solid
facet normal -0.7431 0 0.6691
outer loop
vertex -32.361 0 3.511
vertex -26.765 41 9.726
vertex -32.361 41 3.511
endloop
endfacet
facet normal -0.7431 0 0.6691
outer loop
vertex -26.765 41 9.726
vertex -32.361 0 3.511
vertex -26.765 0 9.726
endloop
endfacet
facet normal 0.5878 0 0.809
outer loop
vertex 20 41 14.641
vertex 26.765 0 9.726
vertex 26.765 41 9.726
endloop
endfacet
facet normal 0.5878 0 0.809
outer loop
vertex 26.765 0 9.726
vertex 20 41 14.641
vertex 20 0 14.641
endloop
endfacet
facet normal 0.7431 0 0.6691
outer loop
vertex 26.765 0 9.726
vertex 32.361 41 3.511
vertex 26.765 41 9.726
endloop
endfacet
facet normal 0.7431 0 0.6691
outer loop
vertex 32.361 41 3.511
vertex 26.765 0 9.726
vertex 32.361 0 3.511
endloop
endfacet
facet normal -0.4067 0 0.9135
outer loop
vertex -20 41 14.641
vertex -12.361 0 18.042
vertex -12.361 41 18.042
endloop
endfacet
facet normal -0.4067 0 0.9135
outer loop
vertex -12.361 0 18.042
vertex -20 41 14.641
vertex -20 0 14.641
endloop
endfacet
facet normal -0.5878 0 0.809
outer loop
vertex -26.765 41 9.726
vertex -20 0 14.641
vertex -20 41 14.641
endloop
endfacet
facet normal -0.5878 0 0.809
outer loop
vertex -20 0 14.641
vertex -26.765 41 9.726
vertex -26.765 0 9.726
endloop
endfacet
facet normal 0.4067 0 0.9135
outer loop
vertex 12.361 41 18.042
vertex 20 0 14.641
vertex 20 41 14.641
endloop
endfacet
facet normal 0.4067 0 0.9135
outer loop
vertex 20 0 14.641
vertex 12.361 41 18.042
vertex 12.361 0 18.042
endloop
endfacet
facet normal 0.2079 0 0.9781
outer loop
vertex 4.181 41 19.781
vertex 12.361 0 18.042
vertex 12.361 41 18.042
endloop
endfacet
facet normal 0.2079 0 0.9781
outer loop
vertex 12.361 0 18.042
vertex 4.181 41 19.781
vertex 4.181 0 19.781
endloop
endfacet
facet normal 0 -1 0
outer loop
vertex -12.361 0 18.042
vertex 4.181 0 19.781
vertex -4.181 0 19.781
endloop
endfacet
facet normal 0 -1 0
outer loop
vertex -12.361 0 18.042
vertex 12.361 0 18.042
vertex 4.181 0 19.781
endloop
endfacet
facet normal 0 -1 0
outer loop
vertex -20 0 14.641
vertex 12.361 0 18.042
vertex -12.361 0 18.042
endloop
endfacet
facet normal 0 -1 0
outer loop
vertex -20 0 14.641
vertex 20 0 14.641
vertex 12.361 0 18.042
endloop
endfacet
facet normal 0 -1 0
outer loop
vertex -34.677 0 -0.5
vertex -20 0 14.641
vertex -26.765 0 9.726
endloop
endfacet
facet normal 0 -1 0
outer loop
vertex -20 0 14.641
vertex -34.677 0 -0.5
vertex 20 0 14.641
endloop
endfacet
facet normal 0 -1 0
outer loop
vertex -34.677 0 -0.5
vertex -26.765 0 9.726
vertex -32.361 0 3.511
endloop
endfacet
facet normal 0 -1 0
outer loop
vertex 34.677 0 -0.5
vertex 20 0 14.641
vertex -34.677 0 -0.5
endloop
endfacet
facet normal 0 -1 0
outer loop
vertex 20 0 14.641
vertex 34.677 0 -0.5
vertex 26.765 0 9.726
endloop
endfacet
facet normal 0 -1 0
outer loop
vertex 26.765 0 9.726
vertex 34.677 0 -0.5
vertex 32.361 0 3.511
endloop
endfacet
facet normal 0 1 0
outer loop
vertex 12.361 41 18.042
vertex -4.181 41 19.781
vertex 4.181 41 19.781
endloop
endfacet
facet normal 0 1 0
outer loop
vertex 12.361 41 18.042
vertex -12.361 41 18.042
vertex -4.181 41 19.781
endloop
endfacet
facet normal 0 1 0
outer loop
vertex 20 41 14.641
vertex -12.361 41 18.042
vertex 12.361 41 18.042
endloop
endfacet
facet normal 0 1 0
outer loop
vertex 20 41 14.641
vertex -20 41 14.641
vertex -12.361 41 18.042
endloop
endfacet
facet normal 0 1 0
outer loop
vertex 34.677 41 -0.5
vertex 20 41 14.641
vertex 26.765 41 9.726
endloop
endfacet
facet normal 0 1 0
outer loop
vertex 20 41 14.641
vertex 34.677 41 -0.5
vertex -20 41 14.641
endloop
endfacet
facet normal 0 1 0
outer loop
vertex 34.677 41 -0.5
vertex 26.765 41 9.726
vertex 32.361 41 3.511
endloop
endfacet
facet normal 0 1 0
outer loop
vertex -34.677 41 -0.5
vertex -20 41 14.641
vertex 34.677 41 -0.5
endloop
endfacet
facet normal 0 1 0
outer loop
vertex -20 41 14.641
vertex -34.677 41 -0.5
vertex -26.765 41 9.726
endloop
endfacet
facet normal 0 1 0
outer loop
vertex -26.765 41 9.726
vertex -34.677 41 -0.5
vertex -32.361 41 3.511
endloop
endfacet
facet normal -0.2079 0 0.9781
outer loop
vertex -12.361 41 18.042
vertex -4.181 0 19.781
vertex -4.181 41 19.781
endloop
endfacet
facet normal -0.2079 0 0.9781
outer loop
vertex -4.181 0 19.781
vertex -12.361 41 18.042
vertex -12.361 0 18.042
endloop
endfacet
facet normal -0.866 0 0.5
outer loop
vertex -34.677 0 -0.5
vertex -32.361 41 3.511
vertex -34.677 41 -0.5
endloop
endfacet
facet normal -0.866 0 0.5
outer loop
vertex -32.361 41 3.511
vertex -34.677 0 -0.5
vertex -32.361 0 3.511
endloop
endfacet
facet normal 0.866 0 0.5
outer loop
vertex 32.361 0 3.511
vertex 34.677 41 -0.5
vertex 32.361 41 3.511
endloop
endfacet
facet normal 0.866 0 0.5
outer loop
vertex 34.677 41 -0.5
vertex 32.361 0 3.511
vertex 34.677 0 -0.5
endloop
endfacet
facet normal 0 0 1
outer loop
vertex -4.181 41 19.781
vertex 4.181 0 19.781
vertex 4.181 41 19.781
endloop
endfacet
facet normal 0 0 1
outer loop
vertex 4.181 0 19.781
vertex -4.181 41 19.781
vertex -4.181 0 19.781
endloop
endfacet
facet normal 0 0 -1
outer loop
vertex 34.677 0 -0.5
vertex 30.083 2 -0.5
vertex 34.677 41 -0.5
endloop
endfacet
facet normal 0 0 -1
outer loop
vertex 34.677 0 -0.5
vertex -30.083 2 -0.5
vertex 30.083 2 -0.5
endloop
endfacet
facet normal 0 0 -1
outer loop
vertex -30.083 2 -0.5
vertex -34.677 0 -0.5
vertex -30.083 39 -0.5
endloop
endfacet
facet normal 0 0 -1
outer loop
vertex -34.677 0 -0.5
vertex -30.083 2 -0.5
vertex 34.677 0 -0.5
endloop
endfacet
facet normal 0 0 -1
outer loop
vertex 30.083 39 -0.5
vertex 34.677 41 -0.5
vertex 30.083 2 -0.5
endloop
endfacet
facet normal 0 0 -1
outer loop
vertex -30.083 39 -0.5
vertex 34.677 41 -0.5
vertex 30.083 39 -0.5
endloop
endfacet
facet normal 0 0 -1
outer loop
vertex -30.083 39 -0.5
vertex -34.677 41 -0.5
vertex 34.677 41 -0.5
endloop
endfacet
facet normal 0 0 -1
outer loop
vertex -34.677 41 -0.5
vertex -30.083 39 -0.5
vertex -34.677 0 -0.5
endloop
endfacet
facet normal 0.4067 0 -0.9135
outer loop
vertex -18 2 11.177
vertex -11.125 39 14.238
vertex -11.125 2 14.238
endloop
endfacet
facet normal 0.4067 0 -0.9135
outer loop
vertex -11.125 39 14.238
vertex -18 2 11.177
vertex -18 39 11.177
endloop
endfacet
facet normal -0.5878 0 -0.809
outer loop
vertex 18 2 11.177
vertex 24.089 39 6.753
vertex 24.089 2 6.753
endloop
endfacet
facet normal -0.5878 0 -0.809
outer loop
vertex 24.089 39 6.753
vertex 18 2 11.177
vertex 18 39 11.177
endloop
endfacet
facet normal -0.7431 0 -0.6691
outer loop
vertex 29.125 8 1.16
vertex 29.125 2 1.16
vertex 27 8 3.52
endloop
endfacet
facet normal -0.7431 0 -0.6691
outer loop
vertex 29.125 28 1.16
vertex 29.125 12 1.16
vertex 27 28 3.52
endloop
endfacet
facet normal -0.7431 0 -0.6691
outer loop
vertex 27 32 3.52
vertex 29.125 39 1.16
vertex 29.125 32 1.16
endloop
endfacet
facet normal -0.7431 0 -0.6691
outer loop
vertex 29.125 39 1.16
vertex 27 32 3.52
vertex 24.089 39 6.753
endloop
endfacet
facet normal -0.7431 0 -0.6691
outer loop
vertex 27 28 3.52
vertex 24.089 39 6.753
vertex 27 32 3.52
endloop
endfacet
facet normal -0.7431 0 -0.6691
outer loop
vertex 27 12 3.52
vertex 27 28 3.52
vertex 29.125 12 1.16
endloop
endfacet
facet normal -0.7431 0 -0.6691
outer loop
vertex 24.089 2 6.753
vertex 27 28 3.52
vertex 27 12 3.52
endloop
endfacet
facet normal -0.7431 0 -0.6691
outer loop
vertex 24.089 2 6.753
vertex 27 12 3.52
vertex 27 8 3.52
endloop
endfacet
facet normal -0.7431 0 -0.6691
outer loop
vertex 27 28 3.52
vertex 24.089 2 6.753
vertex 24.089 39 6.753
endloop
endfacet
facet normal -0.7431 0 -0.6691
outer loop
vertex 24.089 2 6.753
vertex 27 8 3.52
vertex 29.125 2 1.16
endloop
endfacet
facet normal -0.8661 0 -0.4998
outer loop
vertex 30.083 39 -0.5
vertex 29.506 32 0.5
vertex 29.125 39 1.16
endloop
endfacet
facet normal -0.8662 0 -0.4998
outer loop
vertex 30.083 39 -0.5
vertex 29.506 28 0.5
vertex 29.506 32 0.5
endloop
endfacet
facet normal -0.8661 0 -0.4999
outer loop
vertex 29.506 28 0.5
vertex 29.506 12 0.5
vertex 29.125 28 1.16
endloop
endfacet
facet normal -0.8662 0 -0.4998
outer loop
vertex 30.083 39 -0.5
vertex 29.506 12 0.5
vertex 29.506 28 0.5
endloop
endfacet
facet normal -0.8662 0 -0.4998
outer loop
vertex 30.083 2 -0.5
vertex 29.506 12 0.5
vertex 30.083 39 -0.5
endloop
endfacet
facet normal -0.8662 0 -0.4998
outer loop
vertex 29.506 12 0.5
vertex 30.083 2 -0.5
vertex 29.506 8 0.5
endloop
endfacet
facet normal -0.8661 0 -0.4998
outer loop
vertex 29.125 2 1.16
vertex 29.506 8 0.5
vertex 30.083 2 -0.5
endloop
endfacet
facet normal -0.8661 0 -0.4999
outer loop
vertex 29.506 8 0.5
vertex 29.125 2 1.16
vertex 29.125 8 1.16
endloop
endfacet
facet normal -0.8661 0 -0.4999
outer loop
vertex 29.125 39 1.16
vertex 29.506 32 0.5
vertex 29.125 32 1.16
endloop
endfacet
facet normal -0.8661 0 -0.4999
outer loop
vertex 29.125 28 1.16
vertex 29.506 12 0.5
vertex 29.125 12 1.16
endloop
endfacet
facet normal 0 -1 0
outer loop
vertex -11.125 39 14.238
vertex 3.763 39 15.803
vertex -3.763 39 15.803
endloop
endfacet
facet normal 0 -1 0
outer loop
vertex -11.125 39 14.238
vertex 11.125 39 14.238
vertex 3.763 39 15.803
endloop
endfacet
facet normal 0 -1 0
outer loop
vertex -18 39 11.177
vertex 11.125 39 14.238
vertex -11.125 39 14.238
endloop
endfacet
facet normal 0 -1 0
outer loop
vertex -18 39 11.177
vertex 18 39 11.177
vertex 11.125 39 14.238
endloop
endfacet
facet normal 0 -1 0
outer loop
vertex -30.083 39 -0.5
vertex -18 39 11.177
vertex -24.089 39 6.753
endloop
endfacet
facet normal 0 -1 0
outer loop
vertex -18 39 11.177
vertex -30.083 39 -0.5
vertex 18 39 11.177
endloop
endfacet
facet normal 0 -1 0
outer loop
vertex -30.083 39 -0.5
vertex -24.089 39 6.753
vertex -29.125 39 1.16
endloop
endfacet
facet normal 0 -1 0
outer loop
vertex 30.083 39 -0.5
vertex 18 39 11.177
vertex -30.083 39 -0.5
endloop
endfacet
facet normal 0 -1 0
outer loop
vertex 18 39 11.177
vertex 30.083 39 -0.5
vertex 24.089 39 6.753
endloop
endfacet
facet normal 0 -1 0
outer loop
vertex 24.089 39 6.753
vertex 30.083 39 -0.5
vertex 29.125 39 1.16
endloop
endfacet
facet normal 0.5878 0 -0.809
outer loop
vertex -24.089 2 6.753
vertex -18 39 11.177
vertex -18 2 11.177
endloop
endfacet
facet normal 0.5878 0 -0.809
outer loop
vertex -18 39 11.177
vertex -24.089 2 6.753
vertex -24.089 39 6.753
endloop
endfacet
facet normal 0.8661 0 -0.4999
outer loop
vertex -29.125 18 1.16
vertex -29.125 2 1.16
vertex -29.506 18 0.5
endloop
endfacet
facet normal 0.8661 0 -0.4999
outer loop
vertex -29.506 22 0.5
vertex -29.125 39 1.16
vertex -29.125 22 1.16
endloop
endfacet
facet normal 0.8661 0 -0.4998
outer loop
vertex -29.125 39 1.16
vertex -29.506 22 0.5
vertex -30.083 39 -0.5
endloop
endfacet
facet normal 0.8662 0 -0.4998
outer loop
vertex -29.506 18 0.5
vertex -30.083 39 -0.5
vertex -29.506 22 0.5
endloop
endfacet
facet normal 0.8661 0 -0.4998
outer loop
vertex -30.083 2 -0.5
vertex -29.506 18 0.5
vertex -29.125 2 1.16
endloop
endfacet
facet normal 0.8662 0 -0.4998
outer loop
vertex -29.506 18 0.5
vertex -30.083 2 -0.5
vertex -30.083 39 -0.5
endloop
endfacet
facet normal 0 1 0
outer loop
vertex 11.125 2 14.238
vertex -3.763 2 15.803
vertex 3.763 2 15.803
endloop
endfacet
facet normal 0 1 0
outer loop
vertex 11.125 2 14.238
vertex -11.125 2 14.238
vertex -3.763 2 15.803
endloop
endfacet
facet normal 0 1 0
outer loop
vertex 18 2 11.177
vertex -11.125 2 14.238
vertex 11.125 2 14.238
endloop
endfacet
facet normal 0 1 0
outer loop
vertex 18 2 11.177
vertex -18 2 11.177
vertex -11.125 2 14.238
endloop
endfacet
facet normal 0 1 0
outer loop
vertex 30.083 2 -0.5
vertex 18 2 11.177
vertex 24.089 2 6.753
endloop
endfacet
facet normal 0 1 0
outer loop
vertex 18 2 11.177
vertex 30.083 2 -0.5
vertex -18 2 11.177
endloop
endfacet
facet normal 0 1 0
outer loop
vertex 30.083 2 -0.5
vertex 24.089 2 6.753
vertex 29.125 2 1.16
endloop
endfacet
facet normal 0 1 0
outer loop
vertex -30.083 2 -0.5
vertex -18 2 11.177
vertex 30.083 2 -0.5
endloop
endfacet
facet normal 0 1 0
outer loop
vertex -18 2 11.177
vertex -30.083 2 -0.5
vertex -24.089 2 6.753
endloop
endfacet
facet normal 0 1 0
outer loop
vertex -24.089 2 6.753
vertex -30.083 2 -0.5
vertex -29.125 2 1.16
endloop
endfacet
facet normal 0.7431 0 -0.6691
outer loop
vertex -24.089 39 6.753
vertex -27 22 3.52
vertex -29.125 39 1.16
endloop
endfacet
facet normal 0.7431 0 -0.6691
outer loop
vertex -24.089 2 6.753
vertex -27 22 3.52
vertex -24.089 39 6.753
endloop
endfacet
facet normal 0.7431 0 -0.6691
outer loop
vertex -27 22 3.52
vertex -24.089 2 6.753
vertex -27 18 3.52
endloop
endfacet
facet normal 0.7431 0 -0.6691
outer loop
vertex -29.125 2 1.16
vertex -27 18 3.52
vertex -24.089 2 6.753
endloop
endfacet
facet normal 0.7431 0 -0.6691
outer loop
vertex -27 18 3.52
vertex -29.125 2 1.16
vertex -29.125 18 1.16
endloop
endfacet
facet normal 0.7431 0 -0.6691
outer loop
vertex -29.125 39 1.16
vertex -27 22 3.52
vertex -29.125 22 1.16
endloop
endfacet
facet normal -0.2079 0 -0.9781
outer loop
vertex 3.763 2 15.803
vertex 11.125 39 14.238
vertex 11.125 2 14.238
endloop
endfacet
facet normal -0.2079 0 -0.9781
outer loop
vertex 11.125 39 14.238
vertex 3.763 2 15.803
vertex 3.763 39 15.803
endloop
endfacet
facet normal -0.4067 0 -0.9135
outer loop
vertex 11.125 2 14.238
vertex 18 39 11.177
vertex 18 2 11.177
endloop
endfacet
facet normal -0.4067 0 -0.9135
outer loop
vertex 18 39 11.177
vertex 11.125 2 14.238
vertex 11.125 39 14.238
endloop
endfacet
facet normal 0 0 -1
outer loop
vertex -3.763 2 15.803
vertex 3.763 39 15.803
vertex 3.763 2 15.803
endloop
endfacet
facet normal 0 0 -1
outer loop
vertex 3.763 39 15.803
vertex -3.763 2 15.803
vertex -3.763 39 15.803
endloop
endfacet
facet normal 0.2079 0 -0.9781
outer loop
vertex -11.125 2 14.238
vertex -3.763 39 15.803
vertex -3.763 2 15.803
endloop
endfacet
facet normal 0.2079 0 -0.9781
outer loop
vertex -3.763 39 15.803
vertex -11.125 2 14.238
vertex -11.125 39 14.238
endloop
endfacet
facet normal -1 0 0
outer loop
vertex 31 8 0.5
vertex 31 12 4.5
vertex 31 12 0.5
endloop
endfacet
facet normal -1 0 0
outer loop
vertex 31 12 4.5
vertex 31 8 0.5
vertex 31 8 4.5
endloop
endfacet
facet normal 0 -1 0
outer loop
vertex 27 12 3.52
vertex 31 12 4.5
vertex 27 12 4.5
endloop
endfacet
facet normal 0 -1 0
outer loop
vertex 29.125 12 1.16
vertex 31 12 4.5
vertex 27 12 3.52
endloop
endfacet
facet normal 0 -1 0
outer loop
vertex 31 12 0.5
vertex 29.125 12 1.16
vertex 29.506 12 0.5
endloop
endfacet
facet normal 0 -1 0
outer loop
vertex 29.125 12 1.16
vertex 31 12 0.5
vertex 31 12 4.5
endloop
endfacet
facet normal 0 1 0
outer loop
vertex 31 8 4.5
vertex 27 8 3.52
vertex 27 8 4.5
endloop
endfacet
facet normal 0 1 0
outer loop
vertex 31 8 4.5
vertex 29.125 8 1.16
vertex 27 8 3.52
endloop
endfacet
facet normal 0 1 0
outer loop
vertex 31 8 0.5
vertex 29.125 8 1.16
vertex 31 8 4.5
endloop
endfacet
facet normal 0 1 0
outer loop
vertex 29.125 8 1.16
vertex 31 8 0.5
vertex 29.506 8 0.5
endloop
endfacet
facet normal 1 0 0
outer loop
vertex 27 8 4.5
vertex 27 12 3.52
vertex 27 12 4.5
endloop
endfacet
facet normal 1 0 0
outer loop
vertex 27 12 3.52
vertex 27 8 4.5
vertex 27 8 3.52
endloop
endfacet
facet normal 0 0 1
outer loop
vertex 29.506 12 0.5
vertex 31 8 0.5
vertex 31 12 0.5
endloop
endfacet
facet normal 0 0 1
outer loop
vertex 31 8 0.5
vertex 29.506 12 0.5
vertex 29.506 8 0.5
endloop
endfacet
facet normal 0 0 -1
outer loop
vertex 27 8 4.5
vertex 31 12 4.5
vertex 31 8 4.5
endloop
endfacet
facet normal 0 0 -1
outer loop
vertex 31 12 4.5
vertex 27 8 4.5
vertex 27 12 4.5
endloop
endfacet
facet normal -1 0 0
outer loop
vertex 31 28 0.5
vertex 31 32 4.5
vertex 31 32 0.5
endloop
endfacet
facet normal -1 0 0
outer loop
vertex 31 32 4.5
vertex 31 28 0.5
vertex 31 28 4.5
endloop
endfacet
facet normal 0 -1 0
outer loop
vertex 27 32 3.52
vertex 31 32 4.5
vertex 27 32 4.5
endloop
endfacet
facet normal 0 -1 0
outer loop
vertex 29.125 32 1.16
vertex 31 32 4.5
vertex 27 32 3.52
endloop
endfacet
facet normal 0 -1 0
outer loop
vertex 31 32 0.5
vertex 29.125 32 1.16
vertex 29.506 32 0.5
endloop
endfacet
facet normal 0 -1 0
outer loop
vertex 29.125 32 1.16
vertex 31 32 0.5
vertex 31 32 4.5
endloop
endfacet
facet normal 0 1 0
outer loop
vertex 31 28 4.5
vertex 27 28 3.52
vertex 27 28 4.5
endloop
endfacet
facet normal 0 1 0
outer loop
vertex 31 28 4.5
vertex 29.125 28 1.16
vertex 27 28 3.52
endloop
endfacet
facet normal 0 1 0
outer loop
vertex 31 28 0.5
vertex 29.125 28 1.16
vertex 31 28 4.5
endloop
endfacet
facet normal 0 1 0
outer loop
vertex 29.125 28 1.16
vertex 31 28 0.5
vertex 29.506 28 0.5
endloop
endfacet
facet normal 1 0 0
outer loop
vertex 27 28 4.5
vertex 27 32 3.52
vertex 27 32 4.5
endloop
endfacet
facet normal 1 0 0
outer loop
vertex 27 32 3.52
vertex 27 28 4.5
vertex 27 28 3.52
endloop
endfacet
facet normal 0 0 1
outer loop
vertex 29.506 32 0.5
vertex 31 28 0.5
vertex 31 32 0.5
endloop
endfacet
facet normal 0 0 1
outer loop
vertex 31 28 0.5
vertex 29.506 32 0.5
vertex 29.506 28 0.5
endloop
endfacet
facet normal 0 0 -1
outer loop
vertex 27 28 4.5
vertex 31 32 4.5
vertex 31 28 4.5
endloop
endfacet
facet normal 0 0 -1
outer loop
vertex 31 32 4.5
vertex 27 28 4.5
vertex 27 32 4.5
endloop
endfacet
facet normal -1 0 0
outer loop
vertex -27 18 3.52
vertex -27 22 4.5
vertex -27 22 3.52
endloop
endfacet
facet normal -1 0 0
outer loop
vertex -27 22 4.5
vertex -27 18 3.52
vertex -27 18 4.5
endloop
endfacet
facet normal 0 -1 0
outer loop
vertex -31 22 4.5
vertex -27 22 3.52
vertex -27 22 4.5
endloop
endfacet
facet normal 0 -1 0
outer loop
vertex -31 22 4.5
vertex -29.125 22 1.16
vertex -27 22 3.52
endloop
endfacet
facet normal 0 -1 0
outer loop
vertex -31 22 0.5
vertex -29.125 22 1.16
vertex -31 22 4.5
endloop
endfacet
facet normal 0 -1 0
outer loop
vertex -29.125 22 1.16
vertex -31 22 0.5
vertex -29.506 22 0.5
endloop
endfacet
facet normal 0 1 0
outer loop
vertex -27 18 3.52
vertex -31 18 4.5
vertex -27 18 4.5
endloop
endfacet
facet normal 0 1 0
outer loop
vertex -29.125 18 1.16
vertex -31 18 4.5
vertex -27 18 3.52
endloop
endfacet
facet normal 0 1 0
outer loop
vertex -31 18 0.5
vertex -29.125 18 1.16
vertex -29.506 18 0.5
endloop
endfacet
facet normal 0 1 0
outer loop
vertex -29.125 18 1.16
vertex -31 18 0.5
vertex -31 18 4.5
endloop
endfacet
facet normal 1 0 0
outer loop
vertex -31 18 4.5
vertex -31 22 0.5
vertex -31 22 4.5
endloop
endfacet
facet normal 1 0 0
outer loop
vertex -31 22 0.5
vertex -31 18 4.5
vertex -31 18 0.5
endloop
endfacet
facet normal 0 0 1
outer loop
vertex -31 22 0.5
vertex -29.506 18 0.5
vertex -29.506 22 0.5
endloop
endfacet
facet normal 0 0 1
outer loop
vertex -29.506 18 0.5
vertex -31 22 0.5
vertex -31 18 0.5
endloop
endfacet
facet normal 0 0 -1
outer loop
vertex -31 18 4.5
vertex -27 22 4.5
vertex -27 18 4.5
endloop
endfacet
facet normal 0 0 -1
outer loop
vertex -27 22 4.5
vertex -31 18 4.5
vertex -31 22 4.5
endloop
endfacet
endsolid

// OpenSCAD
/*
    TOS Version 3 Top
    
    


*/
rotate(a=[270,0,0]) {
    translate([0,20, 0]) {
        difference() {
            // Main Body Outside
            difference() {
                cylinder(h=41, r=40);
                translate([0,30,0]) {
                    cube(99, center=true);
                }
                
            };

            // Main Body Inside
            difference() {
          
                translate([0,0,2]) {
                    cylinder(h=37, r=36);
                };        
                translate([0,30,0]) {
                    cube(99, center=true);
                }

            };
            
            // Inside Recesses
            // Front 
             translate([29,-22.5,10]) {
                cube(4, center=true);
            }
            
             translate([29,-22.5,30]) {
                cube(4, center=true);
            }
 
 
            // Back
            translate([-29,-22.5,20]) {
                cube(4, center=true);
            }
          /*  
            // Left and right
            translate([0,-23,37]) {
                cube(4, center=true);
            }
                
            translate([0,-23,4]) {
                cube(4, center=true);
            }
            */
        }
    }
}
